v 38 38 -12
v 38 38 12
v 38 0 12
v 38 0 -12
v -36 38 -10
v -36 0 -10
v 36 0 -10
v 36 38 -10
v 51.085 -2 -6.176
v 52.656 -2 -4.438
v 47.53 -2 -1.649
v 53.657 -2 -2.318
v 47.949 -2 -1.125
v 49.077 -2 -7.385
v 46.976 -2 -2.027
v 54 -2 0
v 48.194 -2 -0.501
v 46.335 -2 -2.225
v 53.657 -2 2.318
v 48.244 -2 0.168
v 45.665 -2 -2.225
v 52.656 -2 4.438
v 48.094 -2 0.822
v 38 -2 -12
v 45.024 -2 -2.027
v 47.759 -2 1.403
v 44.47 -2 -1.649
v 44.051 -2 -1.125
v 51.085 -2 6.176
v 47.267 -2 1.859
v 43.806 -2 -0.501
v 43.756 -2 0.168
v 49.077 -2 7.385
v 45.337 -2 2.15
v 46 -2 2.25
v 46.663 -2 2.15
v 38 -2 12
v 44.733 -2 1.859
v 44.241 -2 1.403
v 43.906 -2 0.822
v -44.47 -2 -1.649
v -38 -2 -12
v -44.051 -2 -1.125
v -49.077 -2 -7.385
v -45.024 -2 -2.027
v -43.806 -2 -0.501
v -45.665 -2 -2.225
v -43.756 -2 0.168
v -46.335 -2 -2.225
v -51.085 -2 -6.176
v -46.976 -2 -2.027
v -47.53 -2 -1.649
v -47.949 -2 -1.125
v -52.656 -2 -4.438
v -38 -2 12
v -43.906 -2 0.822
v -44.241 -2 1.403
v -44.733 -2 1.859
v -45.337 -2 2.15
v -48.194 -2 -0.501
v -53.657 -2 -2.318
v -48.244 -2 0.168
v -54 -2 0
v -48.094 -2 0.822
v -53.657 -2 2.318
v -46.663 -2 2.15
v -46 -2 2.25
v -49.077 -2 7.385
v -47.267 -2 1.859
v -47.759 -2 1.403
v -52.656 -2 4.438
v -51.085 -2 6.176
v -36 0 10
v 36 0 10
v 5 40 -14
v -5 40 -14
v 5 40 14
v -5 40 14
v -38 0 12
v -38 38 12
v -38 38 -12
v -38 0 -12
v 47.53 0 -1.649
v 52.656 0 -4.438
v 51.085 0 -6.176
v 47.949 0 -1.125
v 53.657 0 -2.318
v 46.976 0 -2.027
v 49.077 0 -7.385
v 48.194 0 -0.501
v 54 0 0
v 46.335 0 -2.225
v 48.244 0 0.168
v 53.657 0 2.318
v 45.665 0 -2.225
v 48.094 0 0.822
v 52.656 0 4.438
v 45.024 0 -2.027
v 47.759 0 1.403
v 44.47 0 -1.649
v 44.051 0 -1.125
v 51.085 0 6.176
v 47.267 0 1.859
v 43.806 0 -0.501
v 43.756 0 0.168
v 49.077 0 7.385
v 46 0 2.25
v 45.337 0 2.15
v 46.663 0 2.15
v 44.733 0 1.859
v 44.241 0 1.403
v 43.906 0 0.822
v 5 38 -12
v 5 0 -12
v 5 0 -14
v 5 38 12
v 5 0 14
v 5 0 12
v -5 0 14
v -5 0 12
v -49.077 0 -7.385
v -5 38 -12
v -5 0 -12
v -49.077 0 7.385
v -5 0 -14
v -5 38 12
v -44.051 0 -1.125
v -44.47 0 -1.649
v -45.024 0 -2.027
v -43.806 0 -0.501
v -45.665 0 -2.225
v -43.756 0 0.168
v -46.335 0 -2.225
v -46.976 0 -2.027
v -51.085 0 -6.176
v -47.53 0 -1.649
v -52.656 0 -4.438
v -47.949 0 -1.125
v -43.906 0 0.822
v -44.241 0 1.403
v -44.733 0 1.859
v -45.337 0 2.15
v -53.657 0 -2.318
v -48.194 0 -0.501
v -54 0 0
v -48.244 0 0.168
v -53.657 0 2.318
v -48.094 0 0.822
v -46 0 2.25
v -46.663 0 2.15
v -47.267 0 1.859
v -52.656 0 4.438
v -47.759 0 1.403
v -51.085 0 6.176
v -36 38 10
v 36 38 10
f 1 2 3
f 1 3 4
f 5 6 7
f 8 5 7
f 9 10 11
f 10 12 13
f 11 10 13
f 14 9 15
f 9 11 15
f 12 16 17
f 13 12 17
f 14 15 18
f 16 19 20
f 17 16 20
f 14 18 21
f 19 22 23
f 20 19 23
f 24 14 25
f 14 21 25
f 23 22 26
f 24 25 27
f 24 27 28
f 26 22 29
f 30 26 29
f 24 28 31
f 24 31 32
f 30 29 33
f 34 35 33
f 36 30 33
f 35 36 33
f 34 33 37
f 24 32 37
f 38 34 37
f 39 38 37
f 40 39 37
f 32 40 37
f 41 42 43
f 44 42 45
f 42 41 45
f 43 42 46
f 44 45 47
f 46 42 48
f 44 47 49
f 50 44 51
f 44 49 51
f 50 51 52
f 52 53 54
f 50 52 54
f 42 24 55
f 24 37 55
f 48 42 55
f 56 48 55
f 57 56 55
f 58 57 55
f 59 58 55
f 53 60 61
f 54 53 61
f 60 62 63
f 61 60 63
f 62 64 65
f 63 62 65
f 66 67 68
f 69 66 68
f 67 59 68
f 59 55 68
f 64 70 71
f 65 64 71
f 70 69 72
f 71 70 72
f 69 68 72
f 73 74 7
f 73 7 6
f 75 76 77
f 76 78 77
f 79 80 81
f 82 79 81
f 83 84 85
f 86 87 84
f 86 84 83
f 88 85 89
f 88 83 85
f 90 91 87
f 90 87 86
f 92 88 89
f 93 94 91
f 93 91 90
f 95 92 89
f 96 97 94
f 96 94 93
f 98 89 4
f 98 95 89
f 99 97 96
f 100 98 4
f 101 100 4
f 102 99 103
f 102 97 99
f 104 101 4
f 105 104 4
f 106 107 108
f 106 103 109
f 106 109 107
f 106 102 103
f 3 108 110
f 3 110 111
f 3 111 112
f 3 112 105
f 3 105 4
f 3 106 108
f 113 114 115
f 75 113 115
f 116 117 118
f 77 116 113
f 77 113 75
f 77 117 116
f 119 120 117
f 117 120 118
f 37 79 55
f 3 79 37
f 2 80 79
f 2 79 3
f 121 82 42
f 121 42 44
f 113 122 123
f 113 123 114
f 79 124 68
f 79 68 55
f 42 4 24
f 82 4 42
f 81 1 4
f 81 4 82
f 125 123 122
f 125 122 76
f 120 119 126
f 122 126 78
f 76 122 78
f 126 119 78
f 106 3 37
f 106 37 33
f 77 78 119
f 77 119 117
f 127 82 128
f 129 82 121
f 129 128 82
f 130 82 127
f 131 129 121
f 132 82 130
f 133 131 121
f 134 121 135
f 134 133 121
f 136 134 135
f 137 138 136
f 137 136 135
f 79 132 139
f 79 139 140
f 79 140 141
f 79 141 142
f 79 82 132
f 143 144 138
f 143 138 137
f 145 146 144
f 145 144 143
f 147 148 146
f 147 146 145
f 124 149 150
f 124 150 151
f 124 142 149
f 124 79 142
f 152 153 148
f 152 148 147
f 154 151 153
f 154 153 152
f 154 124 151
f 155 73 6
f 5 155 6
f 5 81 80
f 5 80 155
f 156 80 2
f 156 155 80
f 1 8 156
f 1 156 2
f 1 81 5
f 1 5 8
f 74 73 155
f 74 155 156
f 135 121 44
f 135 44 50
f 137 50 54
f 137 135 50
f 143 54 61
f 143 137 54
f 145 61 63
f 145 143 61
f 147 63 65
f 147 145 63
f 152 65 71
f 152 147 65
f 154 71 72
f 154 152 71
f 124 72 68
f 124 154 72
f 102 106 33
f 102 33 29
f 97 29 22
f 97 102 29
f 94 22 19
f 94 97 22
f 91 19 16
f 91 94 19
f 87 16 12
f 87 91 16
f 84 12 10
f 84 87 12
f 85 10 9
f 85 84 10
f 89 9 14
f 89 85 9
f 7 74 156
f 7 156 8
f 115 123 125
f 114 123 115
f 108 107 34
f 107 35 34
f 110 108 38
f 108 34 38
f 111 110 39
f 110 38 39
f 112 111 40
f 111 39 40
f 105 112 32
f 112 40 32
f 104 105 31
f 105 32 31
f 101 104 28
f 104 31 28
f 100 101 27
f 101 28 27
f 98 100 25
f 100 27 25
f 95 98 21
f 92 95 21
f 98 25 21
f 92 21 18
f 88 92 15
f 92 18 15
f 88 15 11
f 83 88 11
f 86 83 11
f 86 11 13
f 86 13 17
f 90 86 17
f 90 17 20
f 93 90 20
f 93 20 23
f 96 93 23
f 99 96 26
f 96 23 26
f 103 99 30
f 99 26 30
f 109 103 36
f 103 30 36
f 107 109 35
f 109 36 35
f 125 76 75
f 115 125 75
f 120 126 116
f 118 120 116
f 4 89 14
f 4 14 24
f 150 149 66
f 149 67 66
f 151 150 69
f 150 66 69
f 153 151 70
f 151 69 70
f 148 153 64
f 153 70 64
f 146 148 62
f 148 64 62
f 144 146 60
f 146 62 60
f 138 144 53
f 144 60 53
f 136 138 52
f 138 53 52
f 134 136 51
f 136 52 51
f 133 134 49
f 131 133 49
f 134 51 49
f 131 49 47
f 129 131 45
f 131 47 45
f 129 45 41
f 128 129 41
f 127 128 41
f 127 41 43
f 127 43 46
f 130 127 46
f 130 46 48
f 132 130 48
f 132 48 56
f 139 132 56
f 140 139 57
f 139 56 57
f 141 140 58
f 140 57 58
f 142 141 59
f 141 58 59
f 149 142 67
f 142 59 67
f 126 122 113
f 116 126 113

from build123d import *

# Parameters (mm, degrees)
SKETCH15_W                    = 76
SKETCH15_H                    = 24
SKETCH15_W_2                  = 72
SKETCH15_H_2                  = 20
BOSS_EXTRUDE8_DEPTH           = 38
SKETCH16_W                    = 10
SKETCH16_H                    = 24
BOSS_EXTRUDE9_DEPTH           = 2
SKETCH17_W                    = 10
SKETCH17_H                    = 40
BOSS_EXTRUDE10_DEPTH          = 2
BOSS_EXTRUDE11_DEPTH          = 2
SKETCH20_W                    = 2.25
SKETCH20_H                    = 2
M4_CLEARANCE_HOLE1_AT_2_COUNT = 2
M4_CLEARANCE_HOLE1_AT_2_PITCH = 92


with BuildPart() as part:
    # Sketch15 → Boss-Extrude8 (new body)
    with BuildSketch(Plane(origin=(0, 0, 0), x_dir=(1, 0, 0), z_dir=(0, 1, 0))):
        Rectangle(SKETCH15_W, SKETCH15_H)
        Rectangle(SKETCH15_W_2, SKETCH15_H_2, mode=Mode.SUBTRACT)
    extrude(amount=BOSS_EXTRUDE8_DEPTH)

    # Sketch18 → Boss-Extrude11 (add)
    with BuildSketch(Plane.XZ):
        with BuildLine():
            Line((-38, 12), (38, 12))
            Line((38, 12), (49.076923077, 7.384615385))
            ThreePointArc((49.076923077, 7.384615385), (54, 0), (49.076923077, -7.384615385))
            Line((49.076923077, -7.384615385), (38, -12))
            Line((38, -12), (-38, -12))
            Line((-38, -12), (-49.076923077, -7.384615385))
            ThreePointArc((-49.076923077, -7.384615385), (-54, 0), (-49.076923077, 7.384615385))
            Line((-49.076923077, 7.384615385), (-38, 12))
        make_face()
    extrude(amount=BOSS_EXTRUDE11_DEPTH)

    # Sketch20 → M4 Clearance Hole1 (revolve, cut)
    with BuildSketch(Plane(origin=(-46, 0, 0), x_dir=(0, 0, 1), z_dir=(1, 0, 0))):
        with Locations((1.125, 1)):
            Rectangle(SKETCH20_W, SKETCH20_H)
    m4_clearance_hole1 = revolve(axis=Axis((-46, 6.35, 0), (0, -1, 0)), mode=Mode.SUBTRACT)

    # M4 Clearance Hole1 at 2: M4 Clearance Hole1 ×2
    with Locations(*[(i * M4_CLEARANCE_HOLE1_AT_2_PITCH, 0, 0) for i in range(1, M4_CLEARANCE_HOLE1_AT_2_COUNT)]):
        add(m4_clearance_hole1, mode=Mode.SUBTRACT)


with BuildPart() as body_2:
    # Sketch16 → Boss-Extrude9 (new body)
    with BuildSketch(Plane(origin=(0, 38, 0), x_dir=(1, 0, 0), z_dir=(0, 1, 0))):
        Rectangle(SKETCH16_W, SKETCH16_H)
    extrude(amount=BOSS_EXTRUDE9_DEPTH)

    # Sketch17 → Boss-Extrude10 (add)
    with BuildSketch(Plane.XY.offset(12)):
        with Locations((0, 20)):
            Rectangle(SKETCH17_W, SKETCH17_H)
    boss_extrude10 = extrude(amount=BOSS_EXTRUDE10_DEPTH)

    # Mirror3: Boss-Extrude10 across plane
    add(boss_extrude10.mirror(Plane.XY))


solid = Compound([part.part, body_2.part])
